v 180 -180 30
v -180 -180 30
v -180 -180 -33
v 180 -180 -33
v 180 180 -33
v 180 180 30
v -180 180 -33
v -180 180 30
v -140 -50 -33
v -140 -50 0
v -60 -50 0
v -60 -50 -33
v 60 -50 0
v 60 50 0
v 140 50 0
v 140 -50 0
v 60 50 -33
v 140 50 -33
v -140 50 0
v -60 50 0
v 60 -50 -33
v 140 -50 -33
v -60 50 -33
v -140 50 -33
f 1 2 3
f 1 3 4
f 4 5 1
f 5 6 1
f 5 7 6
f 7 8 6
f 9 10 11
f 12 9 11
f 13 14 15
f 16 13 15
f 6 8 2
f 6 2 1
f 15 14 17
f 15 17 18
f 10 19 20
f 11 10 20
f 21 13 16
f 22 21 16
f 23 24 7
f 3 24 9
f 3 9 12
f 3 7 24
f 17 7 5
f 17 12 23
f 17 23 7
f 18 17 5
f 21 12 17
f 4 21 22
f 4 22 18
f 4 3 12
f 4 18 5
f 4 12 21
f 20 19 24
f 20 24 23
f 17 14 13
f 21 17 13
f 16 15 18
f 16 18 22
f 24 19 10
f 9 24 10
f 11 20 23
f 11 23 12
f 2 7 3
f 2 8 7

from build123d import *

# Parameters (mm, degrees)
F0_W     = 360
F0_H     = 360
F1_DEPTH = 30
F2_W     = 360
F2_H     = 360
F2_W_2   = 80
F2_H_2   = 100
F3_DEPTH = 33


with BuildPart() as f1:
    # F0 (on Top) → F1 (new body)
    with BuildSketch(Plane.XY):
        Rectangle(F0_W, F0_H)
    extrude(amount=F1_DEPTH)

    # F2 (on face) → F3 (join)
    with BuildSketch(Plane(origin=(0, 0, 0), x_dir=(1, 0, 0), z_dir=(0, 0, -1))):
        Rectangle(F2_W, F2_H)
        with Locations((-100, 0)):
            Rectangle(F2_W_2, F2_H_2, mode=Mode.SUBTRACT)
        with Locations((100, 0)):
            Rectangle(F2_W_2, F2_H_2, mode=Mode.SUBTRACT)
    extrude(amount=F3_DEPTH)


solid = f1.part
